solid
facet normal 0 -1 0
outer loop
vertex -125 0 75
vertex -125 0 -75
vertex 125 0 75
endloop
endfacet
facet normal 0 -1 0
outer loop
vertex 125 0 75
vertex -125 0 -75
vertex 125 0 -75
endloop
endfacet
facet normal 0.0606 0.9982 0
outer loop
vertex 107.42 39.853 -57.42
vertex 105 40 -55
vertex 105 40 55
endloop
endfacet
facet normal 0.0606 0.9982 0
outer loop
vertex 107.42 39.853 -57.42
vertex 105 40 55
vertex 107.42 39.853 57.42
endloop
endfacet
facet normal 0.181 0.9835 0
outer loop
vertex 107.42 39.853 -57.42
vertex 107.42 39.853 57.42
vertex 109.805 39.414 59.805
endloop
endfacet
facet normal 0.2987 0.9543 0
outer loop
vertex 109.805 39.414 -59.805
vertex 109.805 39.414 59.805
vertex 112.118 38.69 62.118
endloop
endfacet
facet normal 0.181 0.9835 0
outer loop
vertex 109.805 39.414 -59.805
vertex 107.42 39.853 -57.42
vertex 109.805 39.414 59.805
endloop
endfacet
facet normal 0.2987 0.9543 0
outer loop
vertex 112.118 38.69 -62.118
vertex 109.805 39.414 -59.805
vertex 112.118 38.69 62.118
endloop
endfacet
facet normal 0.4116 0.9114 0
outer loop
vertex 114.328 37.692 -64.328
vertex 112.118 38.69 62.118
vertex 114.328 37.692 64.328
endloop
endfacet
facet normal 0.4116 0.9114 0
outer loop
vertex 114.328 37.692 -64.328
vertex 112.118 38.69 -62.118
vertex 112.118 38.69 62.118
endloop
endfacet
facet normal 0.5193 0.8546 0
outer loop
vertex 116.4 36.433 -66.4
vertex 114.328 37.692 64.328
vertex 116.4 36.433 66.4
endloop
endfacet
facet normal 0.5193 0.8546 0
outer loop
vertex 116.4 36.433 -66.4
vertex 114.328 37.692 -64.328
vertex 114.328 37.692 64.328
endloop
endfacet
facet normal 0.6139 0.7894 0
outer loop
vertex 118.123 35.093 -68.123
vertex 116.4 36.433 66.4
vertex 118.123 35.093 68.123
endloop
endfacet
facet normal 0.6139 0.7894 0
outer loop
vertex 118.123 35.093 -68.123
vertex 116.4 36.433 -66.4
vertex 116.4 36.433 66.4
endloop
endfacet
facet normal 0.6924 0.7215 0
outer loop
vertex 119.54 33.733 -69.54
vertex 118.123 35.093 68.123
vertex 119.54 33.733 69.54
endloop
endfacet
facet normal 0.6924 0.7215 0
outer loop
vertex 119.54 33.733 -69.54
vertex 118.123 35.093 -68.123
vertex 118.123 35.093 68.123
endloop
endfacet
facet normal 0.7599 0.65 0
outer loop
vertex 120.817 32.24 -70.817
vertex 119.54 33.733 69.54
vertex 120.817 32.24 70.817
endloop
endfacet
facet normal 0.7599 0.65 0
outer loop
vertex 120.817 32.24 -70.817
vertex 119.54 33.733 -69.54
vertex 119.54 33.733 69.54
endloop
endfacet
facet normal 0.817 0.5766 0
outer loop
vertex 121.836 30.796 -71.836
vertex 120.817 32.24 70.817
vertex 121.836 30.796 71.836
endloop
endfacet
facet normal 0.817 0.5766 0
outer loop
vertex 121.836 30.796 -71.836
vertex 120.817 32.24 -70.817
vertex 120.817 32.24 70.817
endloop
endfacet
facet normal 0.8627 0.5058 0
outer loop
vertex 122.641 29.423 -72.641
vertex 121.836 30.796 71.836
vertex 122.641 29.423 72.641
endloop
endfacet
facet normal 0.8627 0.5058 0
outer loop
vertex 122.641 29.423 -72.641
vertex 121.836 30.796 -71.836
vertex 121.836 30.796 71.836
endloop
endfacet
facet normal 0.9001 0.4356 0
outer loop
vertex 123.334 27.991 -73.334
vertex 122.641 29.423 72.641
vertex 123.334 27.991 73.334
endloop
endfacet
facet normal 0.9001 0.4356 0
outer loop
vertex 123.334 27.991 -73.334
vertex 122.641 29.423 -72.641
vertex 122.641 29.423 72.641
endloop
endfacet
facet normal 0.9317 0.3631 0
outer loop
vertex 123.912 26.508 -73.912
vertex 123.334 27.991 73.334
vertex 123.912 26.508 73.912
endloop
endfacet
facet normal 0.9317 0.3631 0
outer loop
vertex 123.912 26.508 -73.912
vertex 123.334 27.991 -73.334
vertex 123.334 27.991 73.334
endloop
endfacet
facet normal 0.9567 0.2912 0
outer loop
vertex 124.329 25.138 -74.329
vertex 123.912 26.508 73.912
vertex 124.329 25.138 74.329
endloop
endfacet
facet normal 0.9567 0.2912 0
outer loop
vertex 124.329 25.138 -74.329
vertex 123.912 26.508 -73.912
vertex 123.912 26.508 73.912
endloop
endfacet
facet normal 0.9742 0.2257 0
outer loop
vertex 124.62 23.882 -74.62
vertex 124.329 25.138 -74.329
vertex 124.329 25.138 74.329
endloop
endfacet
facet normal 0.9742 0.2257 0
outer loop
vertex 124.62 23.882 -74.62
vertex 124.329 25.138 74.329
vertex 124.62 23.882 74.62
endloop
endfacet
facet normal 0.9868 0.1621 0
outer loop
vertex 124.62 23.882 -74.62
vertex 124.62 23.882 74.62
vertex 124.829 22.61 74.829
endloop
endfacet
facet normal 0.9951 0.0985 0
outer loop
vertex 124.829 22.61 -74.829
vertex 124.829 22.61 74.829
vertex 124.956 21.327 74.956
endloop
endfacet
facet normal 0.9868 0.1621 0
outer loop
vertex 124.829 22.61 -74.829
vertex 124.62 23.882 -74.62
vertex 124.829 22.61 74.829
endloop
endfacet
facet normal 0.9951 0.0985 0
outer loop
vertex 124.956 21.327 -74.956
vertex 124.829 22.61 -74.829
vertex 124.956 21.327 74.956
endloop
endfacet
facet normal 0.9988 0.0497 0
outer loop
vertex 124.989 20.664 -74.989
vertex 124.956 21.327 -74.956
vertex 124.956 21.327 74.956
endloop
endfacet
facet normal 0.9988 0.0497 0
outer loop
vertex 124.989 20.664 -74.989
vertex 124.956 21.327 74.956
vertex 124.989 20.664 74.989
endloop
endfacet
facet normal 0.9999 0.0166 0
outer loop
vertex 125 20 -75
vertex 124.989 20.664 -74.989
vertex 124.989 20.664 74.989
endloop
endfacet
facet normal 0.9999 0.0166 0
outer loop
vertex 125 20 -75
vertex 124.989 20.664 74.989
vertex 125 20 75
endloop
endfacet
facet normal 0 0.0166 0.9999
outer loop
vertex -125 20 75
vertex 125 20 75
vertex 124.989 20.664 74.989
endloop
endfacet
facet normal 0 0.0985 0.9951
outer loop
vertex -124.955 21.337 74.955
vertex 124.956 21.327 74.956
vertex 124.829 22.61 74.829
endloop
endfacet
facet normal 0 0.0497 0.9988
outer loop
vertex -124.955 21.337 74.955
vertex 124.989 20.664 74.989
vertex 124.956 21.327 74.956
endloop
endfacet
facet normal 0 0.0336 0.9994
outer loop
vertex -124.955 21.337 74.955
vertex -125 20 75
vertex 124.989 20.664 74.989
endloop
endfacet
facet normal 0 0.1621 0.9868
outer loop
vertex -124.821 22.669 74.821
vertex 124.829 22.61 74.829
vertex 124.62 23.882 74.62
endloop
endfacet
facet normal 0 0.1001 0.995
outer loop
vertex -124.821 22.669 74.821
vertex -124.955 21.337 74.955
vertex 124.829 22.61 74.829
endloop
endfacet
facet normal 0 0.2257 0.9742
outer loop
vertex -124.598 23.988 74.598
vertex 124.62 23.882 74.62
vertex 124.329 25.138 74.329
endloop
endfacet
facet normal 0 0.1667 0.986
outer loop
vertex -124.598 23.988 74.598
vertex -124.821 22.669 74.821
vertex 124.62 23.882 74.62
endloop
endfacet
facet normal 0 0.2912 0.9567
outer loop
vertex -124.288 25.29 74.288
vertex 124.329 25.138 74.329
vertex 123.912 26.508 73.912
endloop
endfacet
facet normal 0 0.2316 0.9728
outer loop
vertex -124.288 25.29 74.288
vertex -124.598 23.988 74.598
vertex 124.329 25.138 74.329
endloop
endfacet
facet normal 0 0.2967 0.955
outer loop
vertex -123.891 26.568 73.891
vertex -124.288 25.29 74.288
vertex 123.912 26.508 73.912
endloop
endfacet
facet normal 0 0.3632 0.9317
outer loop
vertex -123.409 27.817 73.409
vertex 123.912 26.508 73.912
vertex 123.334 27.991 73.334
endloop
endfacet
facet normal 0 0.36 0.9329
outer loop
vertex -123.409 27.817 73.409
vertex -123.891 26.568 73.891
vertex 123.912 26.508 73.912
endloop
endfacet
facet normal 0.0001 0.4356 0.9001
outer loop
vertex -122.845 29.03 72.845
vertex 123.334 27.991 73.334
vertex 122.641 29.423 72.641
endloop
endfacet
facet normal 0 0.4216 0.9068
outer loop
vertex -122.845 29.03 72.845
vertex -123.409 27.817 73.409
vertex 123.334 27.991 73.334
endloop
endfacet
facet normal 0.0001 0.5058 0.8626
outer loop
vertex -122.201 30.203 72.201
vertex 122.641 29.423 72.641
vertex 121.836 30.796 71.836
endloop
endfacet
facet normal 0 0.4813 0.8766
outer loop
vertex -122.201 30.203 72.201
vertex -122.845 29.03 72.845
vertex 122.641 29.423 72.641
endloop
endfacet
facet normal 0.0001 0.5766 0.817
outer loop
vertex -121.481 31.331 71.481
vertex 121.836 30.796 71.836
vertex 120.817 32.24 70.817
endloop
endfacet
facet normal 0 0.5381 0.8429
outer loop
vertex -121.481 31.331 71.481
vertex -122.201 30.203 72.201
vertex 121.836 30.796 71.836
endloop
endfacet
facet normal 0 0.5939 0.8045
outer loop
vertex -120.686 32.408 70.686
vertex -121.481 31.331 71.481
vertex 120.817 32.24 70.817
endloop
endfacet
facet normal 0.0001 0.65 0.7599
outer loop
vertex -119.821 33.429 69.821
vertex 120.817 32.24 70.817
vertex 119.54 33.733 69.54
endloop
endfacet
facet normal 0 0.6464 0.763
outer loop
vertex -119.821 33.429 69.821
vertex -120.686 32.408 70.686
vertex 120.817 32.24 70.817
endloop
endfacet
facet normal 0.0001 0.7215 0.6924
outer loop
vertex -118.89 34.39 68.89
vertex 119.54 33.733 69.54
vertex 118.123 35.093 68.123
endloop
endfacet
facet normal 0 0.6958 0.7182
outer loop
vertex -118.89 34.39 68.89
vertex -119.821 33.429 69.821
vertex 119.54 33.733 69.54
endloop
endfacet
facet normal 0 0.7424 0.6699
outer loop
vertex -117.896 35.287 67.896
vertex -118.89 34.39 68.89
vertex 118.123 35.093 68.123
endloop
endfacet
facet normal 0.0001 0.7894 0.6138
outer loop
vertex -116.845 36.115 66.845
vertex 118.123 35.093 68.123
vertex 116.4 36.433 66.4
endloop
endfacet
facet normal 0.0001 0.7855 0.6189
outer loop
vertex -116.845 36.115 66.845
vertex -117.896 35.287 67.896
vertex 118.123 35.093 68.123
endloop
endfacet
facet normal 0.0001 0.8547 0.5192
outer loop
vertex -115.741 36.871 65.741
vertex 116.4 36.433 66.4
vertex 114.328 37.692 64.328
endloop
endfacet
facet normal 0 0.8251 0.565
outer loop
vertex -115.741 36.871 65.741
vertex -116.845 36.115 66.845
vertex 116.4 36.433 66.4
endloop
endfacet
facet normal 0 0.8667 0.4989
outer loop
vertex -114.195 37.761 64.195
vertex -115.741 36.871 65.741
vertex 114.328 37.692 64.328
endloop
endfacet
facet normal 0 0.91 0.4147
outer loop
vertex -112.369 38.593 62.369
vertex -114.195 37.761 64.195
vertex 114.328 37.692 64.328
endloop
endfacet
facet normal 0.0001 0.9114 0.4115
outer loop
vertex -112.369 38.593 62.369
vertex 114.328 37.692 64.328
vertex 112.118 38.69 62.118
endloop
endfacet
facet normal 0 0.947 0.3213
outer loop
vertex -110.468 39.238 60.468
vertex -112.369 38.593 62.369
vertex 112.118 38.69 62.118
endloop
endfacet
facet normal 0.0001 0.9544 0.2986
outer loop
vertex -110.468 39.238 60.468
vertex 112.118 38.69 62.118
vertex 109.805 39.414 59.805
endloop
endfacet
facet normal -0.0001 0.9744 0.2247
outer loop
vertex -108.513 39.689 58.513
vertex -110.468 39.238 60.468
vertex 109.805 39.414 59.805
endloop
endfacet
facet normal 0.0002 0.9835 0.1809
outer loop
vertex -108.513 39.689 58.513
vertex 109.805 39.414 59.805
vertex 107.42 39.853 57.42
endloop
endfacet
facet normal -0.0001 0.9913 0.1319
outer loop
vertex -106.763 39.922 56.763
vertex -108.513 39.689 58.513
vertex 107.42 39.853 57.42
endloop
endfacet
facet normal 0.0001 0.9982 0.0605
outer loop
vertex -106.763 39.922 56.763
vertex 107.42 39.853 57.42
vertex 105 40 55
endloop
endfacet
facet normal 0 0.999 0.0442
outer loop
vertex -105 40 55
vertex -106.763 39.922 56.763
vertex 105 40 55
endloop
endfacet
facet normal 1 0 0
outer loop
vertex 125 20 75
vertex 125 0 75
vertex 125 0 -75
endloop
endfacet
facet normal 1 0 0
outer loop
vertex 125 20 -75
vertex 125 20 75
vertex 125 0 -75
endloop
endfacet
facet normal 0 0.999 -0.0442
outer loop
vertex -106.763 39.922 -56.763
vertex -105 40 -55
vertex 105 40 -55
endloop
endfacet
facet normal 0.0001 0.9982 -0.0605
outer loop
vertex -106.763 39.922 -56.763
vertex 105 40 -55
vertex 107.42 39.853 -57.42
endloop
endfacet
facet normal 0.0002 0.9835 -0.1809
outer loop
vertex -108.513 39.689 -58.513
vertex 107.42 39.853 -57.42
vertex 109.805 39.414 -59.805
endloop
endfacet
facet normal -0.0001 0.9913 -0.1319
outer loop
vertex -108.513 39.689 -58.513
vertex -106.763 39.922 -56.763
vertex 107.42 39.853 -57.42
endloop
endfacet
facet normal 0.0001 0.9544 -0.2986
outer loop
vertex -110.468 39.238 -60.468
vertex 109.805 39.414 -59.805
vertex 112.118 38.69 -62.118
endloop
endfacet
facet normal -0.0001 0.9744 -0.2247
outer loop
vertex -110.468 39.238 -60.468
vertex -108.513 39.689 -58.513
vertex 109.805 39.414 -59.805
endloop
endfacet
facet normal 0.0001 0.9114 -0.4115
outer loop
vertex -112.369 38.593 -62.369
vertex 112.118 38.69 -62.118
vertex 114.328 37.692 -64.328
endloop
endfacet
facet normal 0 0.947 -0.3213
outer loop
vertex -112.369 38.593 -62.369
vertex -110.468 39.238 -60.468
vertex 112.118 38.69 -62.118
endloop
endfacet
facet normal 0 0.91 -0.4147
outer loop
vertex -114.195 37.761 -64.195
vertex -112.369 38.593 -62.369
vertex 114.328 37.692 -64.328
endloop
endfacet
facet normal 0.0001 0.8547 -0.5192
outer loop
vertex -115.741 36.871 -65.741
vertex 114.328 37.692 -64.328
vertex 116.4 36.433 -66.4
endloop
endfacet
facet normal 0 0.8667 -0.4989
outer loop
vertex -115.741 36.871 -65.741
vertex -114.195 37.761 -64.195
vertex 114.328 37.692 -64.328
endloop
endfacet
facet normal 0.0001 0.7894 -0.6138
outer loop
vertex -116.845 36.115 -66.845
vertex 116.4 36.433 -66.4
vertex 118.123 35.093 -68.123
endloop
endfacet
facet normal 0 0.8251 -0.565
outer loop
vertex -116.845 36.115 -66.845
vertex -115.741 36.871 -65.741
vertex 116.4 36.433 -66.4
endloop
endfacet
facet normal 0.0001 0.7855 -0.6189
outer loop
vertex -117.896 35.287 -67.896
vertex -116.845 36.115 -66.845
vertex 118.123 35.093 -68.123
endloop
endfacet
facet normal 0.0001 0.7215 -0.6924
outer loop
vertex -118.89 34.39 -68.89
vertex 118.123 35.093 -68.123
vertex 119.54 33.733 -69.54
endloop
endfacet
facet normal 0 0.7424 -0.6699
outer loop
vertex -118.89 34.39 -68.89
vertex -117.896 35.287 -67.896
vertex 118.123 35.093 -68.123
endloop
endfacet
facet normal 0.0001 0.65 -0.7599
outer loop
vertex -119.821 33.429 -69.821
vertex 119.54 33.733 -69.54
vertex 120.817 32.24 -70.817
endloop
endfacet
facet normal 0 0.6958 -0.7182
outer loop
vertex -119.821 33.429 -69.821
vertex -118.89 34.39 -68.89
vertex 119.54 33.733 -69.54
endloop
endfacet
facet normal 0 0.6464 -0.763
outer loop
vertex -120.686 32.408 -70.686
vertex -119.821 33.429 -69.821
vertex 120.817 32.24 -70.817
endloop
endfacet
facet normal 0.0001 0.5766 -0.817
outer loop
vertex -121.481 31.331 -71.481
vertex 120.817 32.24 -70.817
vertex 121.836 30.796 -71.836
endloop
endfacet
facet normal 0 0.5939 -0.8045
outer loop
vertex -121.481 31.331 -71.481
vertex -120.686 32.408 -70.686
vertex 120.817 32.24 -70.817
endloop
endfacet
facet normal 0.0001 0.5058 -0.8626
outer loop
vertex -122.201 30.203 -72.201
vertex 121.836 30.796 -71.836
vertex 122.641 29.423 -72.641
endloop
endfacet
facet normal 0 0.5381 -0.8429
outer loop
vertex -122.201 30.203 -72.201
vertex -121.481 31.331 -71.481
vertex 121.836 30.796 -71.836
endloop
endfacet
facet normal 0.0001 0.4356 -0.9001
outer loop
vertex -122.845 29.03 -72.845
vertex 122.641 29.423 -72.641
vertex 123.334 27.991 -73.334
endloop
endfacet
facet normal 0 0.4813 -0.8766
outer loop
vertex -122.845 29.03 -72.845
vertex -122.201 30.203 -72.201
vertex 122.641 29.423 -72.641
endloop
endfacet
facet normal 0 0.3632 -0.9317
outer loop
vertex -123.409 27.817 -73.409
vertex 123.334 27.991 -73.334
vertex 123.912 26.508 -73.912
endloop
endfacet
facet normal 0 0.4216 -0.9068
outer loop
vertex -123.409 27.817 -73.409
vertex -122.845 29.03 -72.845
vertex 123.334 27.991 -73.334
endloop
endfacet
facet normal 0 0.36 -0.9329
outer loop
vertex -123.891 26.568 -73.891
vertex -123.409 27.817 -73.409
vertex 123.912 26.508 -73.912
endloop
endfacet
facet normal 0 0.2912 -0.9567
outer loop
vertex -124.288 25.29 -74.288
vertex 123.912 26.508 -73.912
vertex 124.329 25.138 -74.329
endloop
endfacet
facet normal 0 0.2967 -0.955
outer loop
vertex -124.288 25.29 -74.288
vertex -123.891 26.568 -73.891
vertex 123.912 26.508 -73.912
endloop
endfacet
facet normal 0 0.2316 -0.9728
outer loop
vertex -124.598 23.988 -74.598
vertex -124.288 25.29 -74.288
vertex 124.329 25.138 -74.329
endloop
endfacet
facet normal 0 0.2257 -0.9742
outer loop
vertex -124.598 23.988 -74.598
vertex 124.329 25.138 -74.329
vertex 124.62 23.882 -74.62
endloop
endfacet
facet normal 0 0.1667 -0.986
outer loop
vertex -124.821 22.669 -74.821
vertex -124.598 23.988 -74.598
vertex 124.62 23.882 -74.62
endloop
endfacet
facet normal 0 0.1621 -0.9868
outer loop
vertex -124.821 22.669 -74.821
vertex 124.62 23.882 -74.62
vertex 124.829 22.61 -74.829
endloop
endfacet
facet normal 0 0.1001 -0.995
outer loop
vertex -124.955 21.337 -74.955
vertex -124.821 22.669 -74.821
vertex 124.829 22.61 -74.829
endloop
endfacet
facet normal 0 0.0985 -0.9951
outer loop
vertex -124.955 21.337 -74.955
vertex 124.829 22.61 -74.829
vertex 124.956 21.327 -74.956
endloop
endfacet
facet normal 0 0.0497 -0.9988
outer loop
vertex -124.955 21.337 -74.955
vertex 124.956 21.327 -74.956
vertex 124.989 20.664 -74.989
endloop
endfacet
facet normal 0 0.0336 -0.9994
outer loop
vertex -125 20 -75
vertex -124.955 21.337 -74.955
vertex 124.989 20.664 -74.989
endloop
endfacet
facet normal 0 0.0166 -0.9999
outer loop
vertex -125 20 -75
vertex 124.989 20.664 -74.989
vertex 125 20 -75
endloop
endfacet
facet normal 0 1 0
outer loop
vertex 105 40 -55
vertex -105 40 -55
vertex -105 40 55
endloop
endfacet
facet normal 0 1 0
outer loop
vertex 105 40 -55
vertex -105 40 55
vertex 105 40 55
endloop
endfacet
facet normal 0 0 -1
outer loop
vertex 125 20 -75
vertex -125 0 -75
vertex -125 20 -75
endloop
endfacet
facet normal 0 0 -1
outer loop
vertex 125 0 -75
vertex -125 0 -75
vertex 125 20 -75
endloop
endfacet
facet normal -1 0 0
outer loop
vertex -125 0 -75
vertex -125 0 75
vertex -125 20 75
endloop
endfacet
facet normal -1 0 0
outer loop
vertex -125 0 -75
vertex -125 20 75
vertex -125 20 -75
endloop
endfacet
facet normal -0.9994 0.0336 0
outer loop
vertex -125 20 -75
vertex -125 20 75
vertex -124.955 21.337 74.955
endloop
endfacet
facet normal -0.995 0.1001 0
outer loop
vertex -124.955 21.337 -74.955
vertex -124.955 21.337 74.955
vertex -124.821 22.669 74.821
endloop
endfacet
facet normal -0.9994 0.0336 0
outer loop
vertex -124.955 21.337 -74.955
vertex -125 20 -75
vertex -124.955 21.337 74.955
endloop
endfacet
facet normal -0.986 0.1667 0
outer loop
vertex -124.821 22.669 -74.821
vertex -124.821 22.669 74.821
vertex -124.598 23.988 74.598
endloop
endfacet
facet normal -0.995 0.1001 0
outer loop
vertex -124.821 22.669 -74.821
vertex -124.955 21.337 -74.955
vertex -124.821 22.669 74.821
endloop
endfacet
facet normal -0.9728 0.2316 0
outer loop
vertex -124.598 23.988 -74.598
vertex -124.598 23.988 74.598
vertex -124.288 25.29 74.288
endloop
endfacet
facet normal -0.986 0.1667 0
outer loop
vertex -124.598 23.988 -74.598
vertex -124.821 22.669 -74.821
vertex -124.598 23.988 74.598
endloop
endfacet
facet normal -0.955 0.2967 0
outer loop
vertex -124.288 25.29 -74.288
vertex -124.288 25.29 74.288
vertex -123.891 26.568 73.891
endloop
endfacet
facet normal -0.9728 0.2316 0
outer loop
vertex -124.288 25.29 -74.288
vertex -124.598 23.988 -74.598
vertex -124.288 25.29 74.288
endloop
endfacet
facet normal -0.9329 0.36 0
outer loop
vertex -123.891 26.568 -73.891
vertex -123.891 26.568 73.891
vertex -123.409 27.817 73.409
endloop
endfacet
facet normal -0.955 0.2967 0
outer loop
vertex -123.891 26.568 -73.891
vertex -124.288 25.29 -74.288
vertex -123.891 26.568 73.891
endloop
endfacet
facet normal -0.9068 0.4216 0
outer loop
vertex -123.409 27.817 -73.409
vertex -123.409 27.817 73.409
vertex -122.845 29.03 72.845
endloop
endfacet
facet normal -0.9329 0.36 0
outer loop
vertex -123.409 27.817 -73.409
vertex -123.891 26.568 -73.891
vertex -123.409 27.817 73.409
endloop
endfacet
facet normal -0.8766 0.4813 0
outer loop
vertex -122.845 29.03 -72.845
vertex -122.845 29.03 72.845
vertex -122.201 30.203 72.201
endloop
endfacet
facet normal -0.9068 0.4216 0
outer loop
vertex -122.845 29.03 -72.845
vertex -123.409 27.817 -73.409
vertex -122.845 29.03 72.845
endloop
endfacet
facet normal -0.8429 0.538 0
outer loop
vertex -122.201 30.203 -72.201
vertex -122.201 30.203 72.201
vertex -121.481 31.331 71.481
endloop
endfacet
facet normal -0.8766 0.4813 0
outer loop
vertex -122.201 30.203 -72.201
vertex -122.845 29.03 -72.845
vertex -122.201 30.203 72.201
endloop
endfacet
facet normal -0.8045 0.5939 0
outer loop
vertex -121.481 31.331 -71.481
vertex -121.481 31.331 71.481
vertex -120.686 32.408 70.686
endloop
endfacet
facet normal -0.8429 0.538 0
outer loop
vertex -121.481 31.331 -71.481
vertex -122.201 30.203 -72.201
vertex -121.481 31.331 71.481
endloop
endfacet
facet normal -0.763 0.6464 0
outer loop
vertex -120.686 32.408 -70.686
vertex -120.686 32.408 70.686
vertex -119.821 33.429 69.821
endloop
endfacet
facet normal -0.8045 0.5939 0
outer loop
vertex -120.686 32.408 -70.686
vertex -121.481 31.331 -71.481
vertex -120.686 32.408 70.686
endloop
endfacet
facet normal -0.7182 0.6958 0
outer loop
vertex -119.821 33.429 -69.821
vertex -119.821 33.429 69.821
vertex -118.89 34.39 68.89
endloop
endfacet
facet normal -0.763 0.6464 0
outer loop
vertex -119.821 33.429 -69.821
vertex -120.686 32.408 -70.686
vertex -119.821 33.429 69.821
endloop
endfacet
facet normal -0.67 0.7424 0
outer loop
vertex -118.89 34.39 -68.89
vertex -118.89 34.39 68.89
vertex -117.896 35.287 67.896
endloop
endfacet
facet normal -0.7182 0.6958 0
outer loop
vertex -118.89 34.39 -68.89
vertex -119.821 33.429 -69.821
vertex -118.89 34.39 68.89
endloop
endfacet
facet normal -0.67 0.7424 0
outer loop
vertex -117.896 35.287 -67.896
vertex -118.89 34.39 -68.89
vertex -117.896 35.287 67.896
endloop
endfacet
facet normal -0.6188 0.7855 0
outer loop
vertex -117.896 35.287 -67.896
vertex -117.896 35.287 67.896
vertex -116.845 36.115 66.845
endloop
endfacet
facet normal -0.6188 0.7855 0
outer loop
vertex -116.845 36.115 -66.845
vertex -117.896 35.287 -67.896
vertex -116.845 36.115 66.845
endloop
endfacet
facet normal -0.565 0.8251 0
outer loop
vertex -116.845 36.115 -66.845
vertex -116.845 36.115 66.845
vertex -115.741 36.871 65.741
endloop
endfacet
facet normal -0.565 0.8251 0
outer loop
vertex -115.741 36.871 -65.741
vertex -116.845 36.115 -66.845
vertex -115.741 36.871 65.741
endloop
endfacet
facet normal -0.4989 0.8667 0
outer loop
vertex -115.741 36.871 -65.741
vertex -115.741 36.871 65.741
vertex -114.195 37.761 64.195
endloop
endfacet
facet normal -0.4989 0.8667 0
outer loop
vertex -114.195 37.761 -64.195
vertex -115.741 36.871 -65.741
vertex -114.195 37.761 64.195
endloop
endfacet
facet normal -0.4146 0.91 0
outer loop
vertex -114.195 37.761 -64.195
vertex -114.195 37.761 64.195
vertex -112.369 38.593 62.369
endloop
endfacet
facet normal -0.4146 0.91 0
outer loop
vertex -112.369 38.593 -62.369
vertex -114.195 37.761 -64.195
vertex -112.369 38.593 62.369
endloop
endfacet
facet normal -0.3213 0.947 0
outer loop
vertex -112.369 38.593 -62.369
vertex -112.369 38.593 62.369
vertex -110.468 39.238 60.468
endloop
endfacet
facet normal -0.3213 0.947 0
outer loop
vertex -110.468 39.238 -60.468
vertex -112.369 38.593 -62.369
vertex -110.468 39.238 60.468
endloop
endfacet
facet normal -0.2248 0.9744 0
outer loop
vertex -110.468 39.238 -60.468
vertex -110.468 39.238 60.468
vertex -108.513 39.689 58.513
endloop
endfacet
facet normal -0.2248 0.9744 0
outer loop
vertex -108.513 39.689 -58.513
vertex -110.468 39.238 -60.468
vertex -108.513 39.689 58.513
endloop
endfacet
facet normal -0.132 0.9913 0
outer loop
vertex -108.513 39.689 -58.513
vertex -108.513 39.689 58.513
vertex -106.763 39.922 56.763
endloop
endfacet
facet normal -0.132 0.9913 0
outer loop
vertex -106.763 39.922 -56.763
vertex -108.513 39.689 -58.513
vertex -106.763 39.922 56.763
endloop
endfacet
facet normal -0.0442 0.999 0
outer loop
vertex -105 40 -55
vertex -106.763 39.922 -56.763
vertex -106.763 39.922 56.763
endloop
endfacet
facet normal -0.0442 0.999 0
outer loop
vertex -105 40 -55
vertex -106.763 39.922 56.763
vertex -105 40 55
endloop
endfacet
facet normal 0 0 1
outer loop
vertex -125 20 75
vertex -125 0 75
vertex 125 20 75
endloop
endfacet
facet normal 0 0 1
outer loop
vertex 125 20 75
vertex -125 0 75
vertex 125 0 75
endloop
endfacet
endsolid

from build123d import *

# Parameters (mm, degrees)
SKETCH1_W           = 250
SKETCH1_H           = 150
BOSS_EXTRUDE1_DEPTH = 40
FILLET1_START       = -75
FILLET1_DEPTH       = 150
FILLET1_START_2     = -126
FILLET1_2_DEPTH     = 252


with BuildPart() as part:
    # Sketch1 → Boss-Extrude1 (new body)
    with BuildSketch(Plane(origin=(0, 0, 0), x_dir=(1, 0, 0), z_dir=(0, 1, 0))):
        Rectangle(SKETCH1_W, SKETCH1_H)
    extrude(amount=BOSS_EXTRUDE1_DEPTH)

    # Fillet1: read off the stored shape, not the designer's step
    # Fillet1 outline → Fillet1 (cut)
    with BuildSketch(Plane.XY.offset(FILLET1_START)):
        with BuildLine():
            Line((-125, 40), (-125, 20))
            ThreePointArc((-125, 20), (-119.142135624, 34.142135624), (-105, 40))
            Line((-105, 40), (-125, 40))
        make_face()
        with BuildLine():
            Line((125, 40), (105, 40))
            ThreePointArc((105, 40), (119.142135624, 34.142135624), (125, 20))
            Line((125, 20), (125, 40))
        make_face()
    extrude(amount=FILLET1_DEPTH, mode=Mode.SUBTRACT)

    # Fillet1 2 outline → Fillet1 2 (cut)
    with BuildSketch(Plane.YZ.offset(FILLET1_START_2)):
        with BuildLine():
            Line((40, 75), (20, 75))
            ThreePointArc((20, 75), (34.142135624, 69.142135624), (40, 55))
            Line((40, 55), (40, 75))
        make_face()
        with BuildLine():
            Line((40, -75), (40, -55))
            ThreePointArc((40, -55), (34.142135624, -69.142135624), (20, -75))
            Line((20, -75), (40, -75))
        make_face()
    extrude(amount=FILLET1_2_DEPTH, mode=Mode.SUBTRACT)


solid = part.part
